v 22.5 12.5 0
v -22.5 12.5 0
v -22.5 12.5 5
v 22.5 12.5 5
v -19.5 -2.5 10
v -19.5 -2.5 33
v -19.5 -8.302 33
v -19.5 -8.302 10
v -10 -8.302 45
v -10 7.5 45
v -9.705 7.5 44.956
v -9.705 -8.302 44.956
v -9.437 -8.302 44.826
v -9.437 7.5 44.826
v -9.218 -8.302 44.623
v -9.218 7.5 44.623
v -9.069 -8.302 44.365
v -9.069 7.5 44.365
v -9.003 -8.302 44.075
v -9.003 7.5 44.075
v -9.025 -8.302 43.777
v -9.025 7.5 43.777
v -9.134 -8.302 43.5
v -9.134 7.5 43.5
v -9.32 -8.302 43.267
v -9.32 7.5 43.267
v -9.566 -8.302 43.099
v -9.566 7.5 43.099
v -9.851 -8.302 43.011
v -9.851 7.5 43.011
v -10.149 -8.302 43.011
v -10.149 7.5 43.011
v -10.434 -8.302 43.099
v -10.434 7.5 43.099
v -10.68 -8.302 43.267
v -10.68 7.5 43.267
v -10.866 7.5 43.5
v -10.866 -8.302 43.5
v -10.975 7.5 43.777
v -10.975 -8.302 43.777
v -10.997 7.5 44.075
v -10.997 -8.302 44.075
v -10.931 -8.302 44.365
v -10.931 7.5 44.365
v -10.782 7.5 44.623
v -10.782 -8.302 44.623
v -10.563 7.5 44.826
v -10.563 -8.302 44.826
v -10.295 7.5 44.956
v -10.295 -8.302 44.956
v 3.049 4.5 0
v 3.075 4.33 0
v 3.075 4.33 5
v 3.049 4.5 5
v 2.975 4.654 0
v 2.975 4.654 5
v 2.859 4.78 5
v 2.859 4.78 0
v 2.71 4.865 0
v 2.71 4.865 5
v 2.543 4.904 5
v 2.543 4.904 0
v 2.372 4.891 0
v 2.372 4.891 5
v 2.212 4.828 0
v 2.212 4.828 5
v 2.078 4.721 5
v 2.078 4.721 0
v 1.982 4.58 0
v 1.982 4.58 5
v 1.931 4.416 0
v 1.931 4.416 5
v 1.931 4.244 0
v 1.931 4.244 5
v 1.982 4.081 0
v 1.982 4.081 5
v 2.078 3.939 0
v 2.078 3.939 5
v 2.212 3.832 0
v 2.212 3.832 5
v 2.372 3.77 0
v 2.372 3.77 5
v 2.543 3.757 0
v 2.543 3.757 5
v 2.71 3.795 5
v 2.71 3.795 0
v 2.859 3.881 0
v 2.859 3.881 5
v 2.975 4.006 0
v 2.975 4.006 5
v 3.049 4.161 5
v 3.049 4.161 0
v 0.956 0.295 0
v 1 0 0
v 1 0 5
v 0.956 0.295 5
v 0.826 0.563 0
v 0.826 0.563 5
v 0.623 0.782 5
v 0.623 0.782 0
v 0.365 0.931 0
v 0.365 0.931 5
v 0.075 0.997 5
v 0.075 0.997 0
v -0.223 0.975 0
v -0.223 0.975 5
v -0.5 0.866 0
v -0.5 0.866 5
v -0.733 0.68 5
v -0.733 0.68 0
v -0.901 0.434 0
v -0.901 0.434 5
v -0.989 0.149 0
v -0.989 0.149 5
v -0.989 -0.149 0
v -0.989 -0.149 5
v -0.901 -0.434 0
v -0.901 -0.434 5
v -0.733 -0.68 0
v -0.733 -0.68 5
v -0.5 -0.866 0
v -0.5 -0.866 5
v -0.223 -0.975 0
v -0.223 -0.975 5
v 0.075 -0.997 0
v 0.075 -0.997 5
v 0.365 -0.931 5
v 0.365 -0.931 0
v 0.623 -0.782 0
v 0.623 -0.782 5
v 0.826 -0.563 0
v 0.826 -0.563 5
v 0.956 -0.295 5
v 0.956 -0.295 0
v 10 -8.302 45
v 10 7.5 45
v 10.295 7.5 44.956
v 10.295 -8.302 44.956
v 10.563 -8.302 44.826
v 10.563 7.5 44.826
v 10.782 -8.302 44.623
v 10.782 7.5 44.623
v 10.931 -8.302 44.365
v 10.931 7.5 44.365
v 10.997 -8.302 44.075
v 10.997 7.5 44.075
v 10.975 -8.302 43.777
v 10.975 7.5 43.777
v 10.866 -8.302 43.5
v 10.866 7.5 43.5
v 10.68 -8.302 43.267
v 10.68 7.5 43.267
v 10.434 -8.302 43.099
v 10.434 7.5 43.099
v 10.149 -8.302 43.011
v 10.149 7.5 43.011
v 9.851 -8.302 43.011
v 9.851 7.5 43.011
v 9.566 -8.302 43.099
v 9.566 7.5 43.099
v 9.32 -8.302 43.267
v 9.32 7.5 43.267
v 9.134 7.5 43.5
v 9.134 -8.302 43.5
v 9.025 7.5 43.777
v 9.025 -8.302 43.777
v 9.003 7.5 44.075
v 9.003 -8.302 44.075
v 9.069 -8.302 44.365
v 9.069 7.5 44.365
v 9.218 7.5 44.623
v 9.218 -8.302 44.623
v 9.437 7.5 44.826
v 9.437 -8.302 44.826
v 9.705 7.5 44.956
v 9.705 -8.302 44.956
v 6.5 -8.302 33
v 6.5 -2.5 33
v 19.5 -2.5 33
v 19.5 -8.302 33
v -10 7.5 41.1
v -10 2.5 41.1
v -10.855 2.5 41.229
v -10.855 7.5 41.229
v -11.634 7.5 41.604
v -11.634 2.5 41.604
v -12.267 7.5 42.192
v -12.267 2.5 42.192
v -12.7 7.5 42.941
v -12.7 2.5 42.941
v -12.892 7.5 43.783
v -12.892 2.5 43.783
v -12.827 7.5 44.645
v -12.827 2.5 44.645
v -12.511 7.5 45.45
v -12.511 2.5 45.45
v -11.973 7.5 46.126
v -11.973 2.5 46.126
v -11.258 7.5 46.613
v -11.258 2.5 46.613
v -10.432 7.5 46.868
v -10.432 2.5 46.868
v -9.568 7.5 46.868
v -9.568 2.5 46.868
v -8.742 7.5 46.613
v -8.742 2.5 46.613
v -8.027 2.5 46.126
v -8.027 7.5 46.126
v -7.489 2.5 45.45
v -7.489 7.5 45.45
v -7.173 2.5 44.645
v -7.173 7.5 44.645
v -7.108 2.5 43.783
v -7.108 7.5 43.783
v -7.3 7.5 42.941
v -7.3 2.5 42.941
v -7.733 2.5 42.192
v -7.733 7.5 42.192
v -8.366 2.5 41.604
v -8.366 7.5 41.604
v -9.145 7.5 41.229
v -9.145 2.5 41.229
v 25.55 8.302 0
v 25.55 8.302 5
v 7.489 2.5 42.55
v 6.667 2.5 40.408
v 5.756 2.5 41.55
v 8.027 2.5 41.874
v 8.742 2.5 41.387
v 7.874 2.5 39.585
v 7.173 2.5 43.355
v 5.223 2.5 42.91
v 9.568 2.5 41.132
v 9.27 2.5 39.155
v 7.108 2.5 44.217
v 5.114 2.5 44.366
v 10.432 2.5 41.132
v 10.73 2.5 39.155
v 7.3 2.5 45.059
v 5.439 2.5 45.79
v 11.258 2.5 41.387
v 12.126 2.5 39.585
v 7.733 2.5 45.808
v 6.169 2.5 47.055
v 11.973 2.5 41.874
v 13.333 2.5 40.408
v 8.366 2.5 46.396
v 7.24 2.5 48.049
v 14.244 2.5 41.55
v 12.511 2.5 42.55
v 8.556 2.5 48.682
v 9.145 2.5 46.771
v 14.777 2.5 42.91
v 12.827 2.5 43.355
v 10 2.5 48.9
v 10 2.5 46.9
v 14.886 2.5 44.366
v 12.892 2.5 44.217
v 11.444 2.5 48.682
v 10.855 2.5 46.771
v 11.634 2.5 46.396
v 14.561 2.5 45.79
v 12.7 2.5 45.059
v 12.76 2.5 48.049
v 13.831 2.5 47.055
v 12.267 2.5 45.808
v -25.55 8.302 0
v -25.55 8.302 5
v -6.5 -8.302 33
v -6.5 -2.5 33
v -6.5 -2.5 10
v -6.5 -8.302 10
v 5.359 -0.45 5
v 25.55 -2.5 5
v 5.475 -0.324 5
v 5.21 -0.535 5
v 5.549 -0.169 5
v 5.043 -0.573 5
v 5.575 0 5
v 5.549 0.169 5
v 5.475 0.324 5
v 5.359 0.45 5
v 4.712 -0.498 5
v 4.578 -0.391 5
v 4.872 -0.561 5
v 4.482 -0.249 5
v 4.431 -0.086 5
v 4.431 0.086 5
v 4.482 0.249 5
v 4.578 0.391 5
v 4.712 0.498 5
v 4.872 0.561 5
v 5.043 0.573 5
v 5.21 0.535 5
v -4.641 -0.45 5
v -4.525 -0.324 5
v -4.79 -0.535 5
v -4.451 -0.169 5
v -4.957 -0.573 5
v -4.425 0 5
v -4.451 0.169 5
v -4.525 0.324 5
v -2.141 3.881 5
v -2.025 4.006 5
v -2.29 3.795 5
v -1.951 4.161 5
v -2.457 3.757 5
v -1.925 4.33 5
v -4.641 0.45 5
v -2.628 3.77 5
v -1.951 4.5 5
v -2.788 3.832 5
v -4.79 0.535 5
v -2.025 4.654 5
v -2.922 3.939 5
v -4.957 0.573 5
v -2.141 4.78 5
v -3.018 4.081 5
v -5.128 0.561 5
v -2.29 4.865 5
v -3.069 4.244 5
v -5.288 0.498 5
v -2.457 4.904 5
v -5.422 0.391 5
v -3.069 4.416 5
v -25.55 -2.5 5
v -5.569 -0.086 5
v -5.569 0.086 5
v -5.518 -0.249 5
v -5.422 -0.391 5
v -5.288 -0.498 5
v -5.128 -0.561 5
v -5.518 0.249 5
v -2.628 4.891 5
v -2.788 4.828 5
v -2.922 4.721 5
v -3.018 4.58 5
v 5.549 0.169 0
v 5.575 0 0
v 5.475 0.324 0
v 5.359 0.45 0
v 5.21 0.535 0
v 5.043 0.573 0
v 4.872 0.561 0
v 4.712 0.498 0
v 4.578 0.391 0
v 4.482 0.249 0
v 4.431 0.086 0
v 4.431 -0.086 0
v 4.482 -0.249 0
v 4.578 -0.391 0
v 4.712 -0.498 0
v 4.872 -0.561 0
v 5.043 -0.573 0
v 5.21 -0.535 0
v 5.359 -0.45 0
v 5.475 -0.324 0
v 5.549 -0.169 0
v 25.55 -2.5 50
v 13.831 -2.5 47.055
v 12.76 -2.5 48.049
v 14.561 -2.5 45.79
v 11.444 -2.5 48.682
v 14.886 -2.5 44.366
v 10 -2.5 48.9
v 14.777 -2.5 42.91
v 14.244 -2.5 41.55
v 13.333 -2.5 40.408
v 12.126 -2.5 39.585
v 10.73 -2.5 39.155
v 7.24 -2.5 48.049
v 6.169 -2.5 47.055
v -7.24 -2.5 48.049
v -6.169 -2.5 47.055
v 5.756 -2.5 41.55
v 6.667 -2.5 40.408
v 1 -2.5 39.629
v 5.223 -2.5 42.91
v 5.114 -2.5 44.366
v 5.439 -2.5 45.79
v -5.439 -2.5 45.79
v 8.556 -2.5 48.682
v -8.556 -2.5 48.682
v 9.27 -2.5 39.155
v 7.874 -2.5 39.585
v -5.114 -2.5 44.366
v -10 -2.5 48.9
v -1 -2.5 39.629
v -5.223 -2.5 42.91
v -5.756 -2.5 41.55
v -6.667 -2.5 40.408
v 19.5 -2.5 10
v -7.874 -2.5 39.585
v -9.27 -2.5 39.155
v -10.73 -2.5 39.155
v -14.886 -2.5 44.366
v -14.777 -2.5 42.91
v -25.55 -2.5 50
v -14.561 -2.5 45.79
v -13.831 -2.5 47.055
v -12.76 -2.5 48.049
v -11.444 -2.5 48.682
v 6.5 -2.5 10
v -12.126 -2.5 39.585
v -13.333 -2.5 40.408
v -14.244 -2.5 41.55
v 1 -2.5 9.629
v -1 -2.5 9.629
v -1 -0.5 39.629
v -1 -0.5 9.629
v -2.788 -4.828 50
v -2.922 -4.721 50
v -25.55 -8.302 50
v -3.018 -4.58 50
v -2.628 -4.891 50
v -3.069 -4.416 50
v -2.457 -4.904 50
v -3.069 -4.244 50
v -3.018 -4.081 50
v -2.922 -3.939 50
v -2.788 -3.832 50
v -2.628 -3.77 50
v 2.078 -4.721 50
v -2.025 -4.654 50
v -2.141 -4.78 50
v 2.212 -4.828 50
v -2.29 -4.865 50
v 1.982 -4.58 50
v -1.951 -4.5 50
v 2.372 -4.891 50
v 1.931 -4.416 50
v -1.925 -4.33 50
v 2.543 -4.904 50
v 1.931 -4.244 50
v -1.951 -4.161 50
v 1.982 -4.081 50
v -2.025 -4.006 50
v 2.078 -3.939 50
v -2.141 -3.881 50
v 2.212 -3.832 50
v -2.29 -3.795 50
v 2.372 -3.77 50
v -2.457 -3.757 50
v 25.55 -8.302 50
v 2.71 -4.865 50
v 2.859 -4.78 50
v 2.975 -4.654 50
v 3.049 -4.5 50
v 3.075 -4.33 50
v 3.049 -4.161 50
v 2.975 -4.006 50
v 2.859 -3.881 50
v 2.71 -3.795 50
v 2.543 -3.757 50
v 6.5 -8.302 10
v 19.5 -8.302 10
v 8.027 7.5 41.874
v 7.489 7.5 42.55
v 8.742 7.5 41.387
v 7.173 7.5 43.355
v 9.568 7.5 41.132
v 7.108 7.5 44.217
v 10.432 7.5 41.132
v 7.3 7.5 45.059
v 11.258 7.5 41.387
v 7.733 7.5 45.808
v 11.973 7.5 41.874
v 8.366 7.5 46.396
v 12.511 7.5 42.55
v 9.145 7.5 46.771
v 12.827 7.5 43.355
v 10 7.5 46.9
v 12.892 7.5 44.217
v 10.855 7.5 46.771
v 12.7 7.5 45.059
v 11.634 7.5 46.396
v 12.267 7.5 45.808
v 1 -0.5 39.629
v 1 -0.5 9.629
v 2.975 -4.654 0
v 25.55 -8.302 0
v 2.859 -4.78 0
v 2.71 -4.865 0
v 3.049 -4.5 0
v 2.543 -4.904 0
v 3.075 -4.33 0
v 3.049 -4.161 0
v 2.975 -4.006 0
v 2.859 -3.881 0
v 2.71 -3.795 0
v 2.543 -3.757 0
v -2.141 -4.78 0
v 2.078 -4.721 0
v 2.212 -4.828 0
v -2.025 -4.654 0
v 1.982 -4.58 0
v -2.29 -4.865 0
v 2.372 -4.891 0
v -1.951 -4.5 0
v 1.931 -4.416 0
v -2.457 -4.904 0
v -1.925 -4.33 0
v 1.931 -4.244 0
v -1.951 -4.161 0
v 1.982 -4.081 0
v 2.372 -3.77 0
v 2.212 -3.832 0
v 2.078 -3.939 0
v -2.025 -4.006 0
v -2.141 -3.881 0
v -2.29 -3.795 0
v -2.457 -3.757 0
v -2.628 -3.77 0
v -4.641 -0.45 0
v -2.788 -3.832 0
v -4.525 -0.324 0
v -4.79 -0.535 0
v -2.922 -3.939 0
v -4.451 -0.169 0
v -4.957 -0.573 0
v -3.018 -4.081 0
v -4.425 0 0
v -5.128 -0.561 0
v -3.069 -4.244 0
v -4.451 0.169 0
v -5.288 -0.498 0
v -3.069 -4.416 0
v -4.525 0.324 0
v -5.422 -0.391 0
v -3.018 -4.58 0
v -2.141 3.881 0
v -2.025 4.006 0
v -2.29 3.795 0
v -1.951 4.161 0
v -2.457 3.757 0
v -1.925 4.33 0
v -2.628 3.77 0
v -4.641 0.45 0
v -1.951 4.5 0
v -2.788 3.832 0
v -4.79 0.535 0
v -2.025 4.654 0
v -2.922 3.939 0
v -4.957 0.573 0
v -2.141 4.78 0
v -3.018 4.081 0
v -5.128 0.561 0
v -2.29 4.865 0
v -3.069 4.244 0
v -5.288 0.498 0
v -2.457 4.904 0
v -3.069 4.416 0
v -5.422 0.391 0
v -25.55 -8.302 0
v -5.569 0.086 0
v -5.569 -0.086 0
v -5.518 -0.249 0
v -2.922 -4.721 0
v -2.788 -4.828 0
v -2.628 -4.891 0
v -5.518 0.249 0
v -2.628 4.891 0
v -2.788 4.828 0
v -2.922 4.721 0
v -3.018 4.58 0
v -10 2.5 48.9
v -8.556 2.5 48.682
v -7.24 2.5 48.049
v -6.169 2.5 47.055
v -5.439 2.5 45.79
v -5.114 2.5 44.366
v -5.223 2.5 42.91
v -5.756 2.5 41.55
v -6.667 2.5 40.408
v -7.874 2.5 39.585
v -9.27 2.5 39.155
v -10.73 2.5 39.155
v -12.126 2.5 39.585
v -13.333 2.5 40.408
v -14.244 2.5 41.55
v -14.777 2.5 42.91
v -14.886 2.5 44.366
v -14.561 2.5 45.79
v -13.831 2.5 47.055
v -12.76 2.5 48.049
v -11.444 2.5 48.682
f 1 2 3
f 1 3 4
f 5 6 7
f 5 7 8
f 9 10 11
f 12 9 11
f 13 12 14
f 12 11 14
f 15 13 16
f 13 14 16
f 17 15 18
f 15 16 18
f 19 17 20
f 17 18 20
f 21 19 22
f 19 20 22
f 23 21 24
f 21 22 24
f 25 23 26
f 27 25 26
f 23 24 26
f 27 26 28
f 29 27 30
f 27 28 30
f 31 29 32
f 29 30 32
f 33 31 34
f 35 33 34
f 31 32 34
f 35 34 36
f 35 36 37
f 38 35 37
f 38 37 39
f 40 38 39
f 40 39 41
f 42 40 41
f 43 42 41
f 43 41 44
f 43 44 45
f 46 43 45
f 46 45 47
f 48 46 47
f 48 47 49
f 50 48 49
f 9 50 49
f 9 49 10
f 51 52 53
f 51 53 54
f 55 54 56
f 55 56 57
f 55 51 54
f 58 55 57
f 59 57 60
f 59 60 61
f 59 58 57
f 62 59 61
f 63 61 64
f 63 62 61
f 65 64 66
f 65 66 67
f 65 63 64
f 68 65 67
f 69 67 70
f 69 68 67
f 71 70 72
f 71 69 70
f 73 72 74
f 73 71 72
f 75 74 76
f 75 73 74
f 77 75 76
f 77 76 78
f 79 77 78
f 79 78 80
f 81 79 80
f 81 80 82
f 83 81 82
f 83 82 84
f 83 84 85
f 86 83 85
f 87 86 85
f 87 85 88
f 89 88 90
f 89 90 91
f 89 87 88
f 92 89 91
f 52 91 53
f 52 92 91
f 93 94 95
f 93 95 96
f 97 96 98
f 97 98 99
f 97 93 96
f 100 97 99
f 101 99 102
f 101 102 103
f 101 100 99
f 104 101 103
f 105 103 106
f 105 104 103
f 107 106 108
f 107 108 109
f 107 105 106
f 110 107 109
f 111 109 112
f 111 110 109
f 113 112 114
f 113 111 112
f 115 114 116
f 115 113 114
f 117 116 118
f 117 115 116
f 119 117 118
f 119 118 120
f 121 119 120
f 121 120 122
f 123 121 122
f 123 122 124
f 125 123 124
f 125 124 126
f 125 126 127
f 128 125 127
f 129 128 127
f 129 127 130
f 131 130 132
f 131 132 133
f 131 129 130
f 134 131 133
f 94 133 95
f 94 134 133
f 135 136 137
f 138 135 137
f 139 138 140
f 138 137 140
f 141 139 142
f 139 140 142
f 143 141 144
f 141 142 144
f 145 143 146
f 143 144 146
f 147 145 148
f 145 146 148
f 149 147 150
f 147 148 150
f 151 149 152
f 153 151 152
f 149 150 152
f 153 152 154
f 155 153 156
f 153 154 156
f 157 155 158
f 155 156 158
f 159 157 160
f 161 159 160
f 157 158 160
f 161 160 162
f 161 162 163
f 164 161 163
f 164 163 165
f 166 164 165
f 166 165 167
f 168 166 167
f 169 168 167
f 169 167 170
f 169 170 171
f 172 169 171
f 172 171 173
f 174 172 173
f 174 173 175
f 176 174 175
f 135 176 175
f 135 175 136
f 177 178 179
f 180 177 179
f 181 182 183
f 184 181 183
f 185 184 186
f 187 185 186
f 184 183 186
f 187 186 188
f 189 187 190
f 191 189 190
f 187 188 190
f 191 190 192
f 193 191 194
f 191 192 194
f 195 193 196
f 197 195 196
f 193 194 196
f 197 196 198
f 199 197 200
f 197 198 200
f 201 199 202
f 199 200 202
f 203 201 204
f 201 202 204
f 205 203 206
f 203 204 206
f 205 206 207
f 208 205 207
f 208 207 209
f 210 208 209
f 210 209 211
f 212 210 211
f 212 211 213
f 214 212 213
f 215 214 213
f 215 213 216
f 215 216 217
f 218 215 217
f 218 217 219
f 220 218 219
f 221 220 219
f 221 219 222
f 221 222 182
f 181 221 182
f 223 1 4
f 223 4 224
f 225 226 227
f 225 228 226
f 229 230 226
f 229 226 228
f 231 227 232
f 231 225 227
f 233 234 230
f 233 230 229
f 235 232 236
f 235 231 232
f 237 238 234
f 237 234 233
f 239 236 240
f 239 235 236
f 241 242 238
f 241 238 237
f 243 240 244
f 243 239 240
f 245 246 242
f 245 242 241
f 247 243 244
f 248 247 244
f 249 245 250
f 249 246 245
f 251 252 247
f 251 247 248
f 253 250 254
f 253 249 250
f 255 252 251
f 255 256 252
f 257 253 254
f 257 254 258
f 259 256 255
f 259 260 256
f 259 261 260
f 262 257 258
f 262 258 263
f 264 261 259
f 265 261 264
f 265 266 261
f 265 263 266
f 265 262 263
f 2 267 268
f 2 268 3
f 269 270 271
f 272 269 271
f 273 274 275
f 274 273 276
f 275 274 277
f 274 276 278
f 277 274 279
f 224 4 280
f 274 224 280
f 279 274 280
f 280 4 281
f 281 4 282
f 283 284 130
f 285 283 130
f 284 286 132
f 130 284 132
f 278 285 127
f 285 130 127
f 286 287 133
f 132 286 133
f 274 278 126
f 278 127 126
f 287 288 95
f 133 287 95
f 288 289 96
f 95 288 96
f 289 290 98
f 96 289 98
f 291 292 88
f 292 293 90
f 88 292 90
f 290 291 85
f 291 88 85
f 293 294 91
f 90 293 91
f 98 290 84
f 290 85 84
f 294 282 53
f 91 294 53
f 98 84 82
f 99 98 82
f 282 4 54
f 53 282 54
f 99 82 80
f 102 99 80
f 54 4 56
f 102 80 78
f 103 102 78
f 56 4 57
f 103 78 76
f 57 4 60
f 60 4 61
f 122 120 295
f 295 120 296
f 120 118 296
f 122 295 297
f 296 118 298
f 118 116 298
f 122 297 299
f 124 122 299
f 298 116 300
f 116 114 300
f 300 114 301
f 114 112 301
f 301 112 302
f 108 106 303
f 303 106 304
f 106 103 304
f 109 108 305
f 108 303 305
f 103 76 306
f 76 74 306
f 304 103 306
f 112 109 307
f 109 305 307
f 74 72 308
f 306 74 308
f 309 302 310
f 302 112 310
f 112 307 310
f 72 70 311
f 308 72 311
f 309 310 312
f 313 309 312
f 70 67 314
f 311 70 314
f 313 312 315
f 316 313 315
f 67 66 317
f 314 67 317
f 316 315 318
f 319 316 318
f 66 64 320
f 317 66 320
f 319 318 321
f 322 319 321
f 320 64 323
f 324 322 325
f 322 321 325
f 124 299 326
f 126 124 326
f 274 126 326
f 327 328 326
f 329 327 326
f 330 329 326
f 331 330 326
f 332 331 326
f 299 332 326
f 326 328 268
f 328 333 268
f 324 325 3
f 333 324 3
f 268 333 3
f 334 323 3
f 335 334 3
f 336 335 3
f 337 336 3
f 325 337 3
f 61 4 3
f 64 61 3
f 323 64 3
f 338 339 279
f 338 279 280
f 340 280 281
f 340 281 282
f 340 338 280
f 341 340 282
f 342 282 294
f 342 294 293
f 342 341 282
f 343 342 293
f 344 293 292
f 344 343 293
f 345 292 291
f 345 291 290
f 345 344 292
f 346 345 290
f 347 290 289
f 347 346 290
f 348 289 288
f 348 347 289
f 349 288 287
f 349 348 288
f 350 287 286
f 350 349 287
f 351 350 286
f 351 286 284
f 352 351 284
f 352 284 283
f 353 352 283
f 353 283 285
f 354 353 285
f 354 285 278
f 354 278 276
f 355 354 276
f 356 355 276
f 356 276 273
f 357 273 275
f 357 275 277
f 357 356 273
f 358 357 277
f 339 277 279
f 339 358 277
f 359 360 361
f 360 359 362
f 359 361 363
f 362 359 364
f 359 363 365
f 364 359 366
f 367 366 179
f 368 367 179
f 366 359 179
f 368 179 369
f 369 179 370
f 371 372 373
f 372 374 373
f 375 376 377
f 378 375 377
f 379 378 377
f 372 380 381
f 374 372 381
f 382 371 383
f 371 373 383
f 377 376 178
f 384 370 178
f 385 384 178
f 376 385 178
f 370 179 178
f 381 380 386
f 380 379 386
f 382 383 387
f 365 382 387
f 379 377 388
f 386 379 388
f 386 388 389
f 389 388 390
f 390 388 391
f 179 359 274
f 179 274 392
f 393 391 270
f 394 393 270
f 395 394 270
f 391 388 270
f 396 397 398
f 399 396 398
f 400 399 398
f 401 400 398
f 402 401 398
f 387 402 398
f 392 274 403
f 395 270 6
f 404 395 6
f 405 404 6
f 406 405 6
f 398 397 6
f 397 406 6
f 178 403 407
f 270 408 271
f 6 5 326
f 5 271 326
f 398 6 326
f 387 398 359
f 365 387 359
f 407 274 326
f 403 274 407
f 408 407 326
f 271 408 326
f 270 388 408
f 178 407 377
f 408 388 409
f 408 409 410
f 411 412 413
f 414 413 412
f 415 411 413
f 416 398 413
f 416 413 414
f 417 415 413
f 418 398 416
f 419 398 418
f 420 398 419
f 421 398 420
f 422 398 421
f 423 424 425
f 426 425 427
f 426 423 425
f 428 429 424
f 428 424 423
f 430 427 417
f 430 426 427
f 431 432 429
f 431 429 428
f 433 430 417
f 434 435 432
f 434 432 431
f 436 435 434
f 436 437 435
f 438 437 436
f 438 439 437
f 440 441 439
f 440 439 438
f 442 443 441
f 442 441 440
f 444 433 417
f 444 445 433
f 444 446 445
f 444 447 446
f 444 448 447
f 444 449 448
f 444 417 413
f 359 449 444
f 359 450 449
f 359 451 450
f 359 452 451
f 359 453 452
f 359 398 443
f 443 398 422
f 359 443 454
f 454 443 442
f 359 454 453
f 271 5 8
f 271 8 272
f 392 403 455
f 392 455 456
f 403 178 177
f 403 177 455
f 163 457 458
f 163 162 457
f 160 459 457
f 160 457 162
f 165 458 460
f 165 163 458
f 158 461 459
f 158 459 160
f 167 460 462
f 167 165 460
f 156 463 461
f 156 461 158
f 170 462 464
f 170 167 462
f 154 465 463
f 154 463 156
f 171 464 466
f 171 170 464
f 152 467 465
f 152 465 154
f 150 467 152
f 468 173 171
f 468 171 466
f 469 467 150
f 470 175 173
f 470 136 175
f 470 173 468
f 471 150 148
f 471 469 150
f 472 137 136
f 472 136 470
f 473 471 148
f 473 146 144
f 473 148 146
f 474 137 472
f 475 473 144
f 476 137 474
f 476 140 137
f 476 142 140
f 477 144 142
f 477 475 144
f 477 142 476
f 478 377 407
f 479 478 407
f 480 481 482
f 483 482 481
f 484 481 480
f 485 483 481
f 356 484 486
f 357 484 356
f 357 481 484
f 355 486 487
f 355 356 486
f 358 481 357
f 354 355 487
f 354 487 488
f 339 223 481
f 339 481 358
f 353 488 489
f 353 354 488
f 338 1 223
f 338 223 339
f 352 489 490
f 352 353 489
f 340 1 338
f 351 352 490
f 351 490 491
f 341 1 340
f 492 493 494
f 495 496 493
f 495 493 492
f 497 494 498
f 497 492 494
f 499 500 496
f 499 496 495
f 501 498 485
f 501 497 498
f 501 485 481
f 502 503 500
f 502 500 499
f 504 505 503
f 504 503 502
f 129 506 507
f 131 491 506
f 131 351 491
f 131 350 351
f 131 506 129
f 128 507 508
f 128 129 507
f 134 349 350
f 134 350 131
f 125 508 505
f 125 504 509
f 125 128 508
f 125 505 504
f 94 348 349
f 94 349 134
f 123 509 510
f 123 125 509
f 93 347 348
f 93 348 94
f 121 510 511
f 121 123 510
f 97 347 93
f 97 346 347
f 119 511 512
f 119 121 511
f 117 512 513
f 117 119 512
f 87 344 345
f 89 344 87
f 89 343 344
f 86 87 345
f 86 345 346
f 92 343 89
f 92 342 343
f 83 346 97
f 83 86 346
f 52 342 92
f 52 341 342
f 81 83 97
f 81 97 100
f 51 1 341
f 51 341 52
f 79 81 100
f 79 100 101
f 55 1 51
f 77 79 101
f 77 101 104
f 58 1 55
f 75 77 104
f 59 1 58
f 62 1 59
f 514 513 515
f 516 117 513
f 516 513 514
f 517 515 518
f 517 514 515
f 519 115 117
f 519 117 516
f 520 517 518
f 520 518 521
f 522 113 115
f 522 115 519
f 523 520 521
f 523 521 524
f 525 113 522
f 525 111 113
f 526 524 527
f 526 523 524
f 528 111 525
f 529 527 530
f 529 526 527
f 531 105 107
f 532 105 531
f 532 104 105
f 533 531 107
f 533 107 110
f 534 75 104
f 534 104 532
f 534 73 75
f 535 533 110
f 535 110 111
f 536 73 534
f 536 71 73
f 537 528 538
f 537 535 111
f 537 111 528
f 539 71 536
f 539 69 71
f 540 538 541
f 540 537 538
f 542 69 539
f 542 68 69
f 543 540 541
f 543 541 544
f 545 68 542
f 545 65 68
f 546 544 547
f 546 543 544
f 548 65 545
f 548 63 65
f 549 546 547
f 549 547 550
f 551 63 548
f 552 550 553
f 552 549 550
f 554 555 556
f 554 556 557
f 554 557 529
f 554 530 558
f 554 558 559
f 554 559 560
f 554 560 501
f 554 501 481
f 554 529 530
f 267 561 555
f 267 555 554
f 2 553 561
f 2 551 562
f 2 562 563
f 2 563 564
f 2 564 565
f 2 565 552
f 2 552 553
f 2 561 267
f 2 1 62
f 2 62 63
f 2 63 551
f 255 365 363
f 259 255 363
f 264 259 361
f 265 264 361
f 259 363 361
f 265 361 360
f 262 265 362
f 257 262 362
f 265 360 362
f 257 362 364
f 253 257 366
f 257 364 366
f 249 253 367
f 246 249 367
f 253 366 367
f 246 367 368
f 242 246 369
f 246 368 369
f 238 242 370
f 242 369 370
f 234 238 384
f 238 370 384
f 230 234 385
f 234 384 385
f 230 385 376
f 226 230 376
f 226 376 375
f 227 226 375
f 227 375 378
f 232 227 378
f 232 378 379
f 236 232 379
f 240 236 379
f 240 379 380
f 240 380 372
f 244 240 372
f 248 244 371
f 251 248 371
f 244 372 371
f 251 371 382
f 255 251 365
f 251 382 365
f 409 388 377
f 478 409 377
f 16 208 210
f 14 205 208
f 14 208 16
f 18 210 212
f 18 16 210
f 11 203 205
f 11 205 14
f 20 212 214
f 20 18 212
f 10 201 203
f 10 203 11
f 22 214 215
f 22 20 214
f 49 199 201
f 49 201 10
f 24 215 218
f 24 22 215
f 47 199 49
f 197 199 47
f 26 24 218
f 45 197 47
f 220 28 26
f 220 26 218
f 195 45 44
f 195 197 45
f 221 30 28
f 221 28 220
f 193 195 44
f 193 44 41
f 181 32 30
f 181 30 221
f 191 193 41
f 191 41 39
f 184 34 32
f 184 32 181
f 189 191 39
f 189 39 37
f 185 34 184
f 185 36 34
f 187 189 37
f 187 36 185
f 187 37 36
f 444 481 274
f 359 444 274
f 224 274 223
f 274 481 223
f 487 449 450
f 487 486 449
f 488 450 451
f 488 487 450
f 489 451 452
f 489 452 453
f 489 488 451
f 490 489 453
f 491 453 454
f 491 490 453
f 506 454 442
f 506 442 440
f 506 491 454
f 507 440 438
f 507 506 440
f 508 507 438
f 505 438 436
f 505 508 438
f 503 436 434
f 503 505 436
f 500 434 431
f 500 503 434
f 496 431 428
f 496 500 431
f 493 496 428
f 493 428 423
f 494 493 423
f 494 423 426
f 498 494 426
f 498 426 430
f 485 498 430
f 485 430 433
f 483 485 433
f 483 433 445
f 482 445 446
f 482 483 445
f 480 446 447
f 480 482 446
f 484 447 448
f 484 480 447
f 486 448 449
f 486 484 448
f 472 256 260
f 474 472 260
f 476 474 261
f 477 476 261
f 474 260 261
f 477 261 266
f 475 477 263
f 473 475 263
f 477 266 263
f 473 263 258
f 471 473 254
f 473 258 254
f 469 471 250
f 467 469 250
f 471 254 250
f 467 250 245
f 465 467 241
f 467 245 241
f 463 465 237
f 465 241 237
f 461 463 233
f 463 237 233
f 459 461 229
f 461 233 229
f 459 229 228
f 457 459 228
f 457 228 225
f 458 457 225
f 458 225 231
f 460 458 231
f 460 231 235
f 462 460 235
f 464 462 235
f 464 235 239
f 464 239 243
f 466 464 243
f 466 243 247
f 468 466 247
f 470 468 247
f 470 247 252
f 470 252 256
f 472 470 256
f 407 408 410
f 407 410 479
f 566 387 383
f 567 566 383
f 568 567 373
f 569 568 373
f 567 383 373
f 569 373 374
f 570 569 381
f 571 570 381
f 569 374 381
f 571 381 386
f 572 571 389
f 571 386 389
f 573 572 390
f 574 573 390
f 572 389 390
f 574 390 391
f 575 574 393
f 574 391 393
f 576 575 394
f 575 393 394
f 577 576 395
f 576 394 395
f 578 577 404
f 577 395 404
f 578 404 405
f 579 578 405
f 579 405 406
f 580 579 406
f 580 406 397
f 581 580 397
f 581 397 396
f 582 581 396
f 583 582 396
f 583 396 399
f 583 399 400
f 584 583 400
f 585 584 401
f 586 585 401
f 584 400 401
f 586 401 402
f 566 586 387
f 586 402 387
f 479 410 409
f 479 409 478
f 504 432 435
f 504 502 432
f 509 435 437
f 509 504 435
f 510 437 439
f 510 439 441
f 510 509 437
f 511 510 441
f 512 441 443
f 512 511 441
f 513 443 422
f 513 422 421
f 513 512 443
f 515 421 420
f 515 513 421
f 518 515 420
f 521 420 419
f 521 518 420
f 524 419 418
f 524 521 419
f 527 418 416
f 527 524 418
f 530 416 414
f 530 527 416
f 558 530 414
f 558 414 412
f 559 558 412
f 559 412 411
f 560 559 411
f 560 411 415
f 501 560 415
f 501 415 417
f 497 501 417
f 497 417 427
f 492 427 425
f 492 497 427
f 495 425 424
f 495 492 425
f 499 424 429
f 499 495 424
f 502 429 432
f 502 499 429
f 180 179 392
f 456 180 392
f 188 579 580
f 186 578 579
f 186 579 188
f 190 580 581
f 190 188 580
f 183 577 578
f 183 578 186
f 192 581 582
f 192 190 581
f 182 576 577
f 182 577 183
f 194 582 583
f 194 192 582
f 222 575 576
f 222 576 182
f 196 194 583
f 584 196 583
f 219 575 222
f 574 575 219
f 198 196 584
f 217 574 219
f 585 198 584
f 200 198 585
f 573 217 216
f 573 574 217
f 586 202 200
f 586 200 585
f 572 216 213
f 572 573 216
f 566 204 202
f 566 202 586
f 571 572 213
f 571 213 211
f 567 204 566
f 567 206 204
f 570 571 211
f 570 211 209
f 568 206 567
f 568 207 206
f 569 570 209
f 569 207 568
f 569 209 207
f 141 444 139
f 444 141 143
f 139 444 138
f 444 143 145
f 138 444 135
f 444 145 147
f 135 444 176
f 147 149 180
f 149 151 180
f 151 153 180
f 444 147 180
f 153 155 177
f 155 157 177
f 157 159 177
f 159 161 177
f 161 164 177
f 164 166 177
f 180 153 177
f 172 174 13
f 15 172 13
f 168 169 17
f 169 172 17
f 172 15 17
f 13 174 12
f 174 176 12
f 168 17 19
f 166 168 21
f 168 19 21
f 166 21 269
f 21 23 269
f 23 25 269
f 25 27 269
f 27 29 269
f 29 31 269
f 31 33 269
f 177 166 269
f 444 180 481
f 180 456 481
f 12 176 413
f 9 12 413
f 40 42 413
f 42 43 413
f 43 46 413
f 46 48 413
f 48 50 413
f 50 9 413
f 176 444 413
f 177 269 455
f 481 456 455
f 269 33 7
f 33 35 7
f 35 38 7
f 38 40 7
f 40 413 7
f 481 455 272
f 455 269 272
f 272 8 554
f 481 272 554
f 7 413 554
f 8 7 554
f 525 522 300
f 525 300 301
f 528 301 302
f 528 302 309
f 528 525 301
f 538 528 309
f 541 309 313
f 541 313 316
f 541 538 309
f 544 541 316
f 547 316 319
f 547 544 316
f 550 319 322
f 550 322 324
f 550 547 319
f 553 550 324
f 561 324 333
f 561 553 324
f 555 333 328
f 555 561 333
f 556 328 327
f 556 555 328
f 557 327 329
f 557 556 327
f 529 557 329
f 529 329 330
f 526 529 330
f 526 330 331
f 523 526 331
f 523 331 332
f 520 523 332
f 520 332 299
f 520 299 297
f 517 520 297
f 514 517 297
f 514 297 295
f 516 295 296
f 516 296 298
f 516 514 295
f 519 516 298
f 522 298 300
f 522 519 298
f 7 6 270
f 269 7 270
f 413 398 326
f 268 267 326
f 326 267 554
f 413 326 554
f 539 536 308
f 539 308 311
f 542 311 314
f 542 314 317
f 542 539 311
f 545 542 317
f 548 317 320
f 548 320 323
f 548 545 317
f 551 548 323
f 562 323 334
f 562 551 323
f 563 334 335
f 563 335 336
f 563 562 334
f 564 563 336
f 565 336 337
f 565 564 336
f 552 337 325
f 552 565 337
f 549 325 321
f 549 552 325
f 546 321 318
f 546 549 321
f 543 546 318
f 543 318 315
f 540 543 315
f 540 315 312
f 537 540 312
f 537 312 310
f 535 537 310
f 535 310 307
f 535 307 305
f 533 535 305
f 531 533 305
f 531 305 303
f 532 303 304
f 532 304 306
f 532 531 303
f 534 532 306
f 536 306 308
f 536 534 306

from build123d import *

# Parameters (mm, degrees)
SKETCH1_R               = 1
SKETCH1_R_2             = 0.575
BOSS_EXTRUDE1_DEPTH     = 5
SKETCH2_R               = 0.575
BOSS_EXTRUDE2_DEPTH     = 45
SKETCH4_W               = 2
SKETCH4_H               = 30
BOSS_EXTRUDE3_DEPTH     = 2
SKETCH5_W               = 13
SKETCH5_H               = 23
CUT_EXTRUDE1_DEPTH      = 16
SKETCH6_R               = 2.9
BOSS_EXTRUDE4_DEPTH     = 10
SKETCH7_R               = 1
CUT_EXTRUDE2_DEPTH      = 60.605474742
CUT_EXTRUDE2_DEPTH_BACK = 60.605474742
SKETCH11_R              = 4.9
SKETCH11_R_2            = 2.9
BOSS_EXTRUDE5_DEPTH     = 5
CUT_EXTRUDE4_DEPTH      = 73.577548022
CUT_EXTRUDE4_DEPTH_BACK = 73.577548022


with BuildPart() as part:
    # Sketch1 → Boss-Extrude1 (new body)
    with BuildSketch(Plane.XY):
        Polygon((-22.5, 12.5), (22.5, 12.5), (25.550198027, 8.301762582), (25.550198027, -8.301762582), (22.5, -12.5), (-22.5, -12.5), (-25.550198027, -8.301762582), (-25.550198027, 8.301762582), align=None)
        Circle(SKETCH1_R, mode=Mode.SUBTRACT)
        with Locations((-5, 0)):
            Circle(SKETCH1_R_2, mode=Mode.SUBTRACT)
        with Locations((-2.5, 4.330127019)):
            Circle(SKETCH1_R_2, mode=Mode.SUBTRACT)
        with Locations((2.5, 4.330127019)):
            Circle(SKETCH1_R_2, mode=Mode.SUBTRACT)
        with Locations((5, 0)):
            Circle(SKETCH1_R_2, mode=Mode.SUBTRACT)
        with Locations((2.5, -4.330127019)):
            Circle(SKETCH1_R_2, mode=Mode.SUBTRACT)
        with Locations((-2.5, -4.330127019)):
            Circle(SKETCH1_R_2, mode=Mode.SUBTRACT)
    extrude(amount=BOSS_EXTRUDE1_DEPTH)

    # Sketch2 → Boss-Extrude2 (add)
    with BuildSketch(Plane.XY.offset(5)):
        Polygon((25.550198027, -2.5), (-25.550198027, -2.5), (-25.550198027, -8.301762582), (-22.5, -12.5), (22.5, -12.5), (25.550198027, -8.301762582), align=None)
        with Locations((-2.5, -4.330127019)):
            Circle(SKETCH2_R, mode=Mode.SUBTRACT)
        with Locations((2.5, -4.330127019)):
            Circle(SKETCH2_R, mode=Mode.SUBTRACT)
    extrude(amount=BOSS_EXTRUDE2_DEPTH)

    # Sketch4 → Boss-Extrude3 (add)
    with BuildSketch(Plane(origin=(0, -2.5, 0), x_dir=(1, 0, 0), z_dir=(0, 1, 0))):
        with Locations((0, -24.628925384)):
            Rectangle(SKETCH4_W, SKETCH4_H)
    extrude(amount=BOSS_EXTRUDE3_DEPTH)

    # Sketch5 → Cut-Extrude1 (cut)
    with BuildSketch(Plane(origin=(0, -2.5, 0), x_dir=(1, 0, 0), z_dir=(0, 1, 0))):
        with Locations((13, -21.5)):
            Rectangle(SKETCH5_W, SKETCH5_H)
        with Locations((-13, -21.5)):
            Rectangle(SKETCH5_W, SKETCH5_H)
    extrude(amount=-CUT_EXTRUDE1_DEPTH, mode=Mode.SUBTRACT)

    # Sketch6 → Boss-Extrude4 (add)
    with BuildSketch(Plane(origin=(0, -2.5, 0), x_dir=(1, 0, 0), z_dir=(0, 1, 0))):
        with Locations(Location((10, -44, 0), (0, 0, 270))):
            Circle(SKETCH6_R)
        with Locations(Location((-10, -44, 0), (0, 0, 90))):
            Circle(SKETCH6_R)
    extrude(amount=BOSS_EXTRUDE4_DEPTH)

    # Sketch7 → Cut-Extrude2 (cut, two sides)
    with BuildSketch(Plane(origin=(0, 7.5, 0), x_dir=(1, 0, 0), z_dir=(0, 1, 0))) as cut_extrude2_sk:
        with Locations(Location((10, -44, 0), (0, 0, 270))):
            Circle(SKETCH7_R)
        with Locations(Location((-10, -44, 0), (0, 0, 270))):
            Circle(SKETCH7_R)
    extrude(amount=CUT_EXTRUDE2_DEPTH, mode=Mode.SUBTRACT)
    extrude(cut_extrude2_sk.sketch, amount=-CUT_EXTRUDE2_DEPTH_BACK, mode=Mode.SUBTRACT)

    # Sketch11 → Boss-Extrude5 (add)
    with BuildSketch(Plane(origin=(0, -2.5, 0), x_dir=(1, 0, 0), z_dir=(0, 1, 0))):
        with Locations(Location((-10, -44, 0), (0, 0, 270))):
            Circle(SKETCH11_R)
        with Locations(Location((-10, -44, 0), (0, 0, 90))):
            Circle(SKETCH11_R_2, mode=Mode.SUBTRACT)
        with Locations(Location((10, -44, 0), (0, 0, 270))):
            Circle(SKETCH11_R)
        with Locations(Location((10, -44, 0), (0, 0, 270))):
            Circle(SKETCH11_R_2, mode=Mode.SUBTRACT)
    extrude(amount=BOSS_EXTRUDE5_DEPTH)

    # Sketch13 → Cut-Extrude4 (cut, two sides)
    with BuildSketch(Plane.ZY.offset(25.550198027)) as cut_extrude4_sk:
        Polygon((0, -8.301762582), (-5.234948532, -12.24807669), (12.300258877, -20.537447465), (51.143400136, -17.827460865), (57.147880249, -8.301762582), (50, -8.301762582), align=None)
    extrude(amount=CUT_EXTRUDE4_DEPTH, mode=Mode.SUBTRACT)
    extrude(cut_extrude4_sk.sketch, amount=-CUT_EXTRUDE4_DEPTH_BACK, mode=Mode.SUBTRACT)


solid = part.part
